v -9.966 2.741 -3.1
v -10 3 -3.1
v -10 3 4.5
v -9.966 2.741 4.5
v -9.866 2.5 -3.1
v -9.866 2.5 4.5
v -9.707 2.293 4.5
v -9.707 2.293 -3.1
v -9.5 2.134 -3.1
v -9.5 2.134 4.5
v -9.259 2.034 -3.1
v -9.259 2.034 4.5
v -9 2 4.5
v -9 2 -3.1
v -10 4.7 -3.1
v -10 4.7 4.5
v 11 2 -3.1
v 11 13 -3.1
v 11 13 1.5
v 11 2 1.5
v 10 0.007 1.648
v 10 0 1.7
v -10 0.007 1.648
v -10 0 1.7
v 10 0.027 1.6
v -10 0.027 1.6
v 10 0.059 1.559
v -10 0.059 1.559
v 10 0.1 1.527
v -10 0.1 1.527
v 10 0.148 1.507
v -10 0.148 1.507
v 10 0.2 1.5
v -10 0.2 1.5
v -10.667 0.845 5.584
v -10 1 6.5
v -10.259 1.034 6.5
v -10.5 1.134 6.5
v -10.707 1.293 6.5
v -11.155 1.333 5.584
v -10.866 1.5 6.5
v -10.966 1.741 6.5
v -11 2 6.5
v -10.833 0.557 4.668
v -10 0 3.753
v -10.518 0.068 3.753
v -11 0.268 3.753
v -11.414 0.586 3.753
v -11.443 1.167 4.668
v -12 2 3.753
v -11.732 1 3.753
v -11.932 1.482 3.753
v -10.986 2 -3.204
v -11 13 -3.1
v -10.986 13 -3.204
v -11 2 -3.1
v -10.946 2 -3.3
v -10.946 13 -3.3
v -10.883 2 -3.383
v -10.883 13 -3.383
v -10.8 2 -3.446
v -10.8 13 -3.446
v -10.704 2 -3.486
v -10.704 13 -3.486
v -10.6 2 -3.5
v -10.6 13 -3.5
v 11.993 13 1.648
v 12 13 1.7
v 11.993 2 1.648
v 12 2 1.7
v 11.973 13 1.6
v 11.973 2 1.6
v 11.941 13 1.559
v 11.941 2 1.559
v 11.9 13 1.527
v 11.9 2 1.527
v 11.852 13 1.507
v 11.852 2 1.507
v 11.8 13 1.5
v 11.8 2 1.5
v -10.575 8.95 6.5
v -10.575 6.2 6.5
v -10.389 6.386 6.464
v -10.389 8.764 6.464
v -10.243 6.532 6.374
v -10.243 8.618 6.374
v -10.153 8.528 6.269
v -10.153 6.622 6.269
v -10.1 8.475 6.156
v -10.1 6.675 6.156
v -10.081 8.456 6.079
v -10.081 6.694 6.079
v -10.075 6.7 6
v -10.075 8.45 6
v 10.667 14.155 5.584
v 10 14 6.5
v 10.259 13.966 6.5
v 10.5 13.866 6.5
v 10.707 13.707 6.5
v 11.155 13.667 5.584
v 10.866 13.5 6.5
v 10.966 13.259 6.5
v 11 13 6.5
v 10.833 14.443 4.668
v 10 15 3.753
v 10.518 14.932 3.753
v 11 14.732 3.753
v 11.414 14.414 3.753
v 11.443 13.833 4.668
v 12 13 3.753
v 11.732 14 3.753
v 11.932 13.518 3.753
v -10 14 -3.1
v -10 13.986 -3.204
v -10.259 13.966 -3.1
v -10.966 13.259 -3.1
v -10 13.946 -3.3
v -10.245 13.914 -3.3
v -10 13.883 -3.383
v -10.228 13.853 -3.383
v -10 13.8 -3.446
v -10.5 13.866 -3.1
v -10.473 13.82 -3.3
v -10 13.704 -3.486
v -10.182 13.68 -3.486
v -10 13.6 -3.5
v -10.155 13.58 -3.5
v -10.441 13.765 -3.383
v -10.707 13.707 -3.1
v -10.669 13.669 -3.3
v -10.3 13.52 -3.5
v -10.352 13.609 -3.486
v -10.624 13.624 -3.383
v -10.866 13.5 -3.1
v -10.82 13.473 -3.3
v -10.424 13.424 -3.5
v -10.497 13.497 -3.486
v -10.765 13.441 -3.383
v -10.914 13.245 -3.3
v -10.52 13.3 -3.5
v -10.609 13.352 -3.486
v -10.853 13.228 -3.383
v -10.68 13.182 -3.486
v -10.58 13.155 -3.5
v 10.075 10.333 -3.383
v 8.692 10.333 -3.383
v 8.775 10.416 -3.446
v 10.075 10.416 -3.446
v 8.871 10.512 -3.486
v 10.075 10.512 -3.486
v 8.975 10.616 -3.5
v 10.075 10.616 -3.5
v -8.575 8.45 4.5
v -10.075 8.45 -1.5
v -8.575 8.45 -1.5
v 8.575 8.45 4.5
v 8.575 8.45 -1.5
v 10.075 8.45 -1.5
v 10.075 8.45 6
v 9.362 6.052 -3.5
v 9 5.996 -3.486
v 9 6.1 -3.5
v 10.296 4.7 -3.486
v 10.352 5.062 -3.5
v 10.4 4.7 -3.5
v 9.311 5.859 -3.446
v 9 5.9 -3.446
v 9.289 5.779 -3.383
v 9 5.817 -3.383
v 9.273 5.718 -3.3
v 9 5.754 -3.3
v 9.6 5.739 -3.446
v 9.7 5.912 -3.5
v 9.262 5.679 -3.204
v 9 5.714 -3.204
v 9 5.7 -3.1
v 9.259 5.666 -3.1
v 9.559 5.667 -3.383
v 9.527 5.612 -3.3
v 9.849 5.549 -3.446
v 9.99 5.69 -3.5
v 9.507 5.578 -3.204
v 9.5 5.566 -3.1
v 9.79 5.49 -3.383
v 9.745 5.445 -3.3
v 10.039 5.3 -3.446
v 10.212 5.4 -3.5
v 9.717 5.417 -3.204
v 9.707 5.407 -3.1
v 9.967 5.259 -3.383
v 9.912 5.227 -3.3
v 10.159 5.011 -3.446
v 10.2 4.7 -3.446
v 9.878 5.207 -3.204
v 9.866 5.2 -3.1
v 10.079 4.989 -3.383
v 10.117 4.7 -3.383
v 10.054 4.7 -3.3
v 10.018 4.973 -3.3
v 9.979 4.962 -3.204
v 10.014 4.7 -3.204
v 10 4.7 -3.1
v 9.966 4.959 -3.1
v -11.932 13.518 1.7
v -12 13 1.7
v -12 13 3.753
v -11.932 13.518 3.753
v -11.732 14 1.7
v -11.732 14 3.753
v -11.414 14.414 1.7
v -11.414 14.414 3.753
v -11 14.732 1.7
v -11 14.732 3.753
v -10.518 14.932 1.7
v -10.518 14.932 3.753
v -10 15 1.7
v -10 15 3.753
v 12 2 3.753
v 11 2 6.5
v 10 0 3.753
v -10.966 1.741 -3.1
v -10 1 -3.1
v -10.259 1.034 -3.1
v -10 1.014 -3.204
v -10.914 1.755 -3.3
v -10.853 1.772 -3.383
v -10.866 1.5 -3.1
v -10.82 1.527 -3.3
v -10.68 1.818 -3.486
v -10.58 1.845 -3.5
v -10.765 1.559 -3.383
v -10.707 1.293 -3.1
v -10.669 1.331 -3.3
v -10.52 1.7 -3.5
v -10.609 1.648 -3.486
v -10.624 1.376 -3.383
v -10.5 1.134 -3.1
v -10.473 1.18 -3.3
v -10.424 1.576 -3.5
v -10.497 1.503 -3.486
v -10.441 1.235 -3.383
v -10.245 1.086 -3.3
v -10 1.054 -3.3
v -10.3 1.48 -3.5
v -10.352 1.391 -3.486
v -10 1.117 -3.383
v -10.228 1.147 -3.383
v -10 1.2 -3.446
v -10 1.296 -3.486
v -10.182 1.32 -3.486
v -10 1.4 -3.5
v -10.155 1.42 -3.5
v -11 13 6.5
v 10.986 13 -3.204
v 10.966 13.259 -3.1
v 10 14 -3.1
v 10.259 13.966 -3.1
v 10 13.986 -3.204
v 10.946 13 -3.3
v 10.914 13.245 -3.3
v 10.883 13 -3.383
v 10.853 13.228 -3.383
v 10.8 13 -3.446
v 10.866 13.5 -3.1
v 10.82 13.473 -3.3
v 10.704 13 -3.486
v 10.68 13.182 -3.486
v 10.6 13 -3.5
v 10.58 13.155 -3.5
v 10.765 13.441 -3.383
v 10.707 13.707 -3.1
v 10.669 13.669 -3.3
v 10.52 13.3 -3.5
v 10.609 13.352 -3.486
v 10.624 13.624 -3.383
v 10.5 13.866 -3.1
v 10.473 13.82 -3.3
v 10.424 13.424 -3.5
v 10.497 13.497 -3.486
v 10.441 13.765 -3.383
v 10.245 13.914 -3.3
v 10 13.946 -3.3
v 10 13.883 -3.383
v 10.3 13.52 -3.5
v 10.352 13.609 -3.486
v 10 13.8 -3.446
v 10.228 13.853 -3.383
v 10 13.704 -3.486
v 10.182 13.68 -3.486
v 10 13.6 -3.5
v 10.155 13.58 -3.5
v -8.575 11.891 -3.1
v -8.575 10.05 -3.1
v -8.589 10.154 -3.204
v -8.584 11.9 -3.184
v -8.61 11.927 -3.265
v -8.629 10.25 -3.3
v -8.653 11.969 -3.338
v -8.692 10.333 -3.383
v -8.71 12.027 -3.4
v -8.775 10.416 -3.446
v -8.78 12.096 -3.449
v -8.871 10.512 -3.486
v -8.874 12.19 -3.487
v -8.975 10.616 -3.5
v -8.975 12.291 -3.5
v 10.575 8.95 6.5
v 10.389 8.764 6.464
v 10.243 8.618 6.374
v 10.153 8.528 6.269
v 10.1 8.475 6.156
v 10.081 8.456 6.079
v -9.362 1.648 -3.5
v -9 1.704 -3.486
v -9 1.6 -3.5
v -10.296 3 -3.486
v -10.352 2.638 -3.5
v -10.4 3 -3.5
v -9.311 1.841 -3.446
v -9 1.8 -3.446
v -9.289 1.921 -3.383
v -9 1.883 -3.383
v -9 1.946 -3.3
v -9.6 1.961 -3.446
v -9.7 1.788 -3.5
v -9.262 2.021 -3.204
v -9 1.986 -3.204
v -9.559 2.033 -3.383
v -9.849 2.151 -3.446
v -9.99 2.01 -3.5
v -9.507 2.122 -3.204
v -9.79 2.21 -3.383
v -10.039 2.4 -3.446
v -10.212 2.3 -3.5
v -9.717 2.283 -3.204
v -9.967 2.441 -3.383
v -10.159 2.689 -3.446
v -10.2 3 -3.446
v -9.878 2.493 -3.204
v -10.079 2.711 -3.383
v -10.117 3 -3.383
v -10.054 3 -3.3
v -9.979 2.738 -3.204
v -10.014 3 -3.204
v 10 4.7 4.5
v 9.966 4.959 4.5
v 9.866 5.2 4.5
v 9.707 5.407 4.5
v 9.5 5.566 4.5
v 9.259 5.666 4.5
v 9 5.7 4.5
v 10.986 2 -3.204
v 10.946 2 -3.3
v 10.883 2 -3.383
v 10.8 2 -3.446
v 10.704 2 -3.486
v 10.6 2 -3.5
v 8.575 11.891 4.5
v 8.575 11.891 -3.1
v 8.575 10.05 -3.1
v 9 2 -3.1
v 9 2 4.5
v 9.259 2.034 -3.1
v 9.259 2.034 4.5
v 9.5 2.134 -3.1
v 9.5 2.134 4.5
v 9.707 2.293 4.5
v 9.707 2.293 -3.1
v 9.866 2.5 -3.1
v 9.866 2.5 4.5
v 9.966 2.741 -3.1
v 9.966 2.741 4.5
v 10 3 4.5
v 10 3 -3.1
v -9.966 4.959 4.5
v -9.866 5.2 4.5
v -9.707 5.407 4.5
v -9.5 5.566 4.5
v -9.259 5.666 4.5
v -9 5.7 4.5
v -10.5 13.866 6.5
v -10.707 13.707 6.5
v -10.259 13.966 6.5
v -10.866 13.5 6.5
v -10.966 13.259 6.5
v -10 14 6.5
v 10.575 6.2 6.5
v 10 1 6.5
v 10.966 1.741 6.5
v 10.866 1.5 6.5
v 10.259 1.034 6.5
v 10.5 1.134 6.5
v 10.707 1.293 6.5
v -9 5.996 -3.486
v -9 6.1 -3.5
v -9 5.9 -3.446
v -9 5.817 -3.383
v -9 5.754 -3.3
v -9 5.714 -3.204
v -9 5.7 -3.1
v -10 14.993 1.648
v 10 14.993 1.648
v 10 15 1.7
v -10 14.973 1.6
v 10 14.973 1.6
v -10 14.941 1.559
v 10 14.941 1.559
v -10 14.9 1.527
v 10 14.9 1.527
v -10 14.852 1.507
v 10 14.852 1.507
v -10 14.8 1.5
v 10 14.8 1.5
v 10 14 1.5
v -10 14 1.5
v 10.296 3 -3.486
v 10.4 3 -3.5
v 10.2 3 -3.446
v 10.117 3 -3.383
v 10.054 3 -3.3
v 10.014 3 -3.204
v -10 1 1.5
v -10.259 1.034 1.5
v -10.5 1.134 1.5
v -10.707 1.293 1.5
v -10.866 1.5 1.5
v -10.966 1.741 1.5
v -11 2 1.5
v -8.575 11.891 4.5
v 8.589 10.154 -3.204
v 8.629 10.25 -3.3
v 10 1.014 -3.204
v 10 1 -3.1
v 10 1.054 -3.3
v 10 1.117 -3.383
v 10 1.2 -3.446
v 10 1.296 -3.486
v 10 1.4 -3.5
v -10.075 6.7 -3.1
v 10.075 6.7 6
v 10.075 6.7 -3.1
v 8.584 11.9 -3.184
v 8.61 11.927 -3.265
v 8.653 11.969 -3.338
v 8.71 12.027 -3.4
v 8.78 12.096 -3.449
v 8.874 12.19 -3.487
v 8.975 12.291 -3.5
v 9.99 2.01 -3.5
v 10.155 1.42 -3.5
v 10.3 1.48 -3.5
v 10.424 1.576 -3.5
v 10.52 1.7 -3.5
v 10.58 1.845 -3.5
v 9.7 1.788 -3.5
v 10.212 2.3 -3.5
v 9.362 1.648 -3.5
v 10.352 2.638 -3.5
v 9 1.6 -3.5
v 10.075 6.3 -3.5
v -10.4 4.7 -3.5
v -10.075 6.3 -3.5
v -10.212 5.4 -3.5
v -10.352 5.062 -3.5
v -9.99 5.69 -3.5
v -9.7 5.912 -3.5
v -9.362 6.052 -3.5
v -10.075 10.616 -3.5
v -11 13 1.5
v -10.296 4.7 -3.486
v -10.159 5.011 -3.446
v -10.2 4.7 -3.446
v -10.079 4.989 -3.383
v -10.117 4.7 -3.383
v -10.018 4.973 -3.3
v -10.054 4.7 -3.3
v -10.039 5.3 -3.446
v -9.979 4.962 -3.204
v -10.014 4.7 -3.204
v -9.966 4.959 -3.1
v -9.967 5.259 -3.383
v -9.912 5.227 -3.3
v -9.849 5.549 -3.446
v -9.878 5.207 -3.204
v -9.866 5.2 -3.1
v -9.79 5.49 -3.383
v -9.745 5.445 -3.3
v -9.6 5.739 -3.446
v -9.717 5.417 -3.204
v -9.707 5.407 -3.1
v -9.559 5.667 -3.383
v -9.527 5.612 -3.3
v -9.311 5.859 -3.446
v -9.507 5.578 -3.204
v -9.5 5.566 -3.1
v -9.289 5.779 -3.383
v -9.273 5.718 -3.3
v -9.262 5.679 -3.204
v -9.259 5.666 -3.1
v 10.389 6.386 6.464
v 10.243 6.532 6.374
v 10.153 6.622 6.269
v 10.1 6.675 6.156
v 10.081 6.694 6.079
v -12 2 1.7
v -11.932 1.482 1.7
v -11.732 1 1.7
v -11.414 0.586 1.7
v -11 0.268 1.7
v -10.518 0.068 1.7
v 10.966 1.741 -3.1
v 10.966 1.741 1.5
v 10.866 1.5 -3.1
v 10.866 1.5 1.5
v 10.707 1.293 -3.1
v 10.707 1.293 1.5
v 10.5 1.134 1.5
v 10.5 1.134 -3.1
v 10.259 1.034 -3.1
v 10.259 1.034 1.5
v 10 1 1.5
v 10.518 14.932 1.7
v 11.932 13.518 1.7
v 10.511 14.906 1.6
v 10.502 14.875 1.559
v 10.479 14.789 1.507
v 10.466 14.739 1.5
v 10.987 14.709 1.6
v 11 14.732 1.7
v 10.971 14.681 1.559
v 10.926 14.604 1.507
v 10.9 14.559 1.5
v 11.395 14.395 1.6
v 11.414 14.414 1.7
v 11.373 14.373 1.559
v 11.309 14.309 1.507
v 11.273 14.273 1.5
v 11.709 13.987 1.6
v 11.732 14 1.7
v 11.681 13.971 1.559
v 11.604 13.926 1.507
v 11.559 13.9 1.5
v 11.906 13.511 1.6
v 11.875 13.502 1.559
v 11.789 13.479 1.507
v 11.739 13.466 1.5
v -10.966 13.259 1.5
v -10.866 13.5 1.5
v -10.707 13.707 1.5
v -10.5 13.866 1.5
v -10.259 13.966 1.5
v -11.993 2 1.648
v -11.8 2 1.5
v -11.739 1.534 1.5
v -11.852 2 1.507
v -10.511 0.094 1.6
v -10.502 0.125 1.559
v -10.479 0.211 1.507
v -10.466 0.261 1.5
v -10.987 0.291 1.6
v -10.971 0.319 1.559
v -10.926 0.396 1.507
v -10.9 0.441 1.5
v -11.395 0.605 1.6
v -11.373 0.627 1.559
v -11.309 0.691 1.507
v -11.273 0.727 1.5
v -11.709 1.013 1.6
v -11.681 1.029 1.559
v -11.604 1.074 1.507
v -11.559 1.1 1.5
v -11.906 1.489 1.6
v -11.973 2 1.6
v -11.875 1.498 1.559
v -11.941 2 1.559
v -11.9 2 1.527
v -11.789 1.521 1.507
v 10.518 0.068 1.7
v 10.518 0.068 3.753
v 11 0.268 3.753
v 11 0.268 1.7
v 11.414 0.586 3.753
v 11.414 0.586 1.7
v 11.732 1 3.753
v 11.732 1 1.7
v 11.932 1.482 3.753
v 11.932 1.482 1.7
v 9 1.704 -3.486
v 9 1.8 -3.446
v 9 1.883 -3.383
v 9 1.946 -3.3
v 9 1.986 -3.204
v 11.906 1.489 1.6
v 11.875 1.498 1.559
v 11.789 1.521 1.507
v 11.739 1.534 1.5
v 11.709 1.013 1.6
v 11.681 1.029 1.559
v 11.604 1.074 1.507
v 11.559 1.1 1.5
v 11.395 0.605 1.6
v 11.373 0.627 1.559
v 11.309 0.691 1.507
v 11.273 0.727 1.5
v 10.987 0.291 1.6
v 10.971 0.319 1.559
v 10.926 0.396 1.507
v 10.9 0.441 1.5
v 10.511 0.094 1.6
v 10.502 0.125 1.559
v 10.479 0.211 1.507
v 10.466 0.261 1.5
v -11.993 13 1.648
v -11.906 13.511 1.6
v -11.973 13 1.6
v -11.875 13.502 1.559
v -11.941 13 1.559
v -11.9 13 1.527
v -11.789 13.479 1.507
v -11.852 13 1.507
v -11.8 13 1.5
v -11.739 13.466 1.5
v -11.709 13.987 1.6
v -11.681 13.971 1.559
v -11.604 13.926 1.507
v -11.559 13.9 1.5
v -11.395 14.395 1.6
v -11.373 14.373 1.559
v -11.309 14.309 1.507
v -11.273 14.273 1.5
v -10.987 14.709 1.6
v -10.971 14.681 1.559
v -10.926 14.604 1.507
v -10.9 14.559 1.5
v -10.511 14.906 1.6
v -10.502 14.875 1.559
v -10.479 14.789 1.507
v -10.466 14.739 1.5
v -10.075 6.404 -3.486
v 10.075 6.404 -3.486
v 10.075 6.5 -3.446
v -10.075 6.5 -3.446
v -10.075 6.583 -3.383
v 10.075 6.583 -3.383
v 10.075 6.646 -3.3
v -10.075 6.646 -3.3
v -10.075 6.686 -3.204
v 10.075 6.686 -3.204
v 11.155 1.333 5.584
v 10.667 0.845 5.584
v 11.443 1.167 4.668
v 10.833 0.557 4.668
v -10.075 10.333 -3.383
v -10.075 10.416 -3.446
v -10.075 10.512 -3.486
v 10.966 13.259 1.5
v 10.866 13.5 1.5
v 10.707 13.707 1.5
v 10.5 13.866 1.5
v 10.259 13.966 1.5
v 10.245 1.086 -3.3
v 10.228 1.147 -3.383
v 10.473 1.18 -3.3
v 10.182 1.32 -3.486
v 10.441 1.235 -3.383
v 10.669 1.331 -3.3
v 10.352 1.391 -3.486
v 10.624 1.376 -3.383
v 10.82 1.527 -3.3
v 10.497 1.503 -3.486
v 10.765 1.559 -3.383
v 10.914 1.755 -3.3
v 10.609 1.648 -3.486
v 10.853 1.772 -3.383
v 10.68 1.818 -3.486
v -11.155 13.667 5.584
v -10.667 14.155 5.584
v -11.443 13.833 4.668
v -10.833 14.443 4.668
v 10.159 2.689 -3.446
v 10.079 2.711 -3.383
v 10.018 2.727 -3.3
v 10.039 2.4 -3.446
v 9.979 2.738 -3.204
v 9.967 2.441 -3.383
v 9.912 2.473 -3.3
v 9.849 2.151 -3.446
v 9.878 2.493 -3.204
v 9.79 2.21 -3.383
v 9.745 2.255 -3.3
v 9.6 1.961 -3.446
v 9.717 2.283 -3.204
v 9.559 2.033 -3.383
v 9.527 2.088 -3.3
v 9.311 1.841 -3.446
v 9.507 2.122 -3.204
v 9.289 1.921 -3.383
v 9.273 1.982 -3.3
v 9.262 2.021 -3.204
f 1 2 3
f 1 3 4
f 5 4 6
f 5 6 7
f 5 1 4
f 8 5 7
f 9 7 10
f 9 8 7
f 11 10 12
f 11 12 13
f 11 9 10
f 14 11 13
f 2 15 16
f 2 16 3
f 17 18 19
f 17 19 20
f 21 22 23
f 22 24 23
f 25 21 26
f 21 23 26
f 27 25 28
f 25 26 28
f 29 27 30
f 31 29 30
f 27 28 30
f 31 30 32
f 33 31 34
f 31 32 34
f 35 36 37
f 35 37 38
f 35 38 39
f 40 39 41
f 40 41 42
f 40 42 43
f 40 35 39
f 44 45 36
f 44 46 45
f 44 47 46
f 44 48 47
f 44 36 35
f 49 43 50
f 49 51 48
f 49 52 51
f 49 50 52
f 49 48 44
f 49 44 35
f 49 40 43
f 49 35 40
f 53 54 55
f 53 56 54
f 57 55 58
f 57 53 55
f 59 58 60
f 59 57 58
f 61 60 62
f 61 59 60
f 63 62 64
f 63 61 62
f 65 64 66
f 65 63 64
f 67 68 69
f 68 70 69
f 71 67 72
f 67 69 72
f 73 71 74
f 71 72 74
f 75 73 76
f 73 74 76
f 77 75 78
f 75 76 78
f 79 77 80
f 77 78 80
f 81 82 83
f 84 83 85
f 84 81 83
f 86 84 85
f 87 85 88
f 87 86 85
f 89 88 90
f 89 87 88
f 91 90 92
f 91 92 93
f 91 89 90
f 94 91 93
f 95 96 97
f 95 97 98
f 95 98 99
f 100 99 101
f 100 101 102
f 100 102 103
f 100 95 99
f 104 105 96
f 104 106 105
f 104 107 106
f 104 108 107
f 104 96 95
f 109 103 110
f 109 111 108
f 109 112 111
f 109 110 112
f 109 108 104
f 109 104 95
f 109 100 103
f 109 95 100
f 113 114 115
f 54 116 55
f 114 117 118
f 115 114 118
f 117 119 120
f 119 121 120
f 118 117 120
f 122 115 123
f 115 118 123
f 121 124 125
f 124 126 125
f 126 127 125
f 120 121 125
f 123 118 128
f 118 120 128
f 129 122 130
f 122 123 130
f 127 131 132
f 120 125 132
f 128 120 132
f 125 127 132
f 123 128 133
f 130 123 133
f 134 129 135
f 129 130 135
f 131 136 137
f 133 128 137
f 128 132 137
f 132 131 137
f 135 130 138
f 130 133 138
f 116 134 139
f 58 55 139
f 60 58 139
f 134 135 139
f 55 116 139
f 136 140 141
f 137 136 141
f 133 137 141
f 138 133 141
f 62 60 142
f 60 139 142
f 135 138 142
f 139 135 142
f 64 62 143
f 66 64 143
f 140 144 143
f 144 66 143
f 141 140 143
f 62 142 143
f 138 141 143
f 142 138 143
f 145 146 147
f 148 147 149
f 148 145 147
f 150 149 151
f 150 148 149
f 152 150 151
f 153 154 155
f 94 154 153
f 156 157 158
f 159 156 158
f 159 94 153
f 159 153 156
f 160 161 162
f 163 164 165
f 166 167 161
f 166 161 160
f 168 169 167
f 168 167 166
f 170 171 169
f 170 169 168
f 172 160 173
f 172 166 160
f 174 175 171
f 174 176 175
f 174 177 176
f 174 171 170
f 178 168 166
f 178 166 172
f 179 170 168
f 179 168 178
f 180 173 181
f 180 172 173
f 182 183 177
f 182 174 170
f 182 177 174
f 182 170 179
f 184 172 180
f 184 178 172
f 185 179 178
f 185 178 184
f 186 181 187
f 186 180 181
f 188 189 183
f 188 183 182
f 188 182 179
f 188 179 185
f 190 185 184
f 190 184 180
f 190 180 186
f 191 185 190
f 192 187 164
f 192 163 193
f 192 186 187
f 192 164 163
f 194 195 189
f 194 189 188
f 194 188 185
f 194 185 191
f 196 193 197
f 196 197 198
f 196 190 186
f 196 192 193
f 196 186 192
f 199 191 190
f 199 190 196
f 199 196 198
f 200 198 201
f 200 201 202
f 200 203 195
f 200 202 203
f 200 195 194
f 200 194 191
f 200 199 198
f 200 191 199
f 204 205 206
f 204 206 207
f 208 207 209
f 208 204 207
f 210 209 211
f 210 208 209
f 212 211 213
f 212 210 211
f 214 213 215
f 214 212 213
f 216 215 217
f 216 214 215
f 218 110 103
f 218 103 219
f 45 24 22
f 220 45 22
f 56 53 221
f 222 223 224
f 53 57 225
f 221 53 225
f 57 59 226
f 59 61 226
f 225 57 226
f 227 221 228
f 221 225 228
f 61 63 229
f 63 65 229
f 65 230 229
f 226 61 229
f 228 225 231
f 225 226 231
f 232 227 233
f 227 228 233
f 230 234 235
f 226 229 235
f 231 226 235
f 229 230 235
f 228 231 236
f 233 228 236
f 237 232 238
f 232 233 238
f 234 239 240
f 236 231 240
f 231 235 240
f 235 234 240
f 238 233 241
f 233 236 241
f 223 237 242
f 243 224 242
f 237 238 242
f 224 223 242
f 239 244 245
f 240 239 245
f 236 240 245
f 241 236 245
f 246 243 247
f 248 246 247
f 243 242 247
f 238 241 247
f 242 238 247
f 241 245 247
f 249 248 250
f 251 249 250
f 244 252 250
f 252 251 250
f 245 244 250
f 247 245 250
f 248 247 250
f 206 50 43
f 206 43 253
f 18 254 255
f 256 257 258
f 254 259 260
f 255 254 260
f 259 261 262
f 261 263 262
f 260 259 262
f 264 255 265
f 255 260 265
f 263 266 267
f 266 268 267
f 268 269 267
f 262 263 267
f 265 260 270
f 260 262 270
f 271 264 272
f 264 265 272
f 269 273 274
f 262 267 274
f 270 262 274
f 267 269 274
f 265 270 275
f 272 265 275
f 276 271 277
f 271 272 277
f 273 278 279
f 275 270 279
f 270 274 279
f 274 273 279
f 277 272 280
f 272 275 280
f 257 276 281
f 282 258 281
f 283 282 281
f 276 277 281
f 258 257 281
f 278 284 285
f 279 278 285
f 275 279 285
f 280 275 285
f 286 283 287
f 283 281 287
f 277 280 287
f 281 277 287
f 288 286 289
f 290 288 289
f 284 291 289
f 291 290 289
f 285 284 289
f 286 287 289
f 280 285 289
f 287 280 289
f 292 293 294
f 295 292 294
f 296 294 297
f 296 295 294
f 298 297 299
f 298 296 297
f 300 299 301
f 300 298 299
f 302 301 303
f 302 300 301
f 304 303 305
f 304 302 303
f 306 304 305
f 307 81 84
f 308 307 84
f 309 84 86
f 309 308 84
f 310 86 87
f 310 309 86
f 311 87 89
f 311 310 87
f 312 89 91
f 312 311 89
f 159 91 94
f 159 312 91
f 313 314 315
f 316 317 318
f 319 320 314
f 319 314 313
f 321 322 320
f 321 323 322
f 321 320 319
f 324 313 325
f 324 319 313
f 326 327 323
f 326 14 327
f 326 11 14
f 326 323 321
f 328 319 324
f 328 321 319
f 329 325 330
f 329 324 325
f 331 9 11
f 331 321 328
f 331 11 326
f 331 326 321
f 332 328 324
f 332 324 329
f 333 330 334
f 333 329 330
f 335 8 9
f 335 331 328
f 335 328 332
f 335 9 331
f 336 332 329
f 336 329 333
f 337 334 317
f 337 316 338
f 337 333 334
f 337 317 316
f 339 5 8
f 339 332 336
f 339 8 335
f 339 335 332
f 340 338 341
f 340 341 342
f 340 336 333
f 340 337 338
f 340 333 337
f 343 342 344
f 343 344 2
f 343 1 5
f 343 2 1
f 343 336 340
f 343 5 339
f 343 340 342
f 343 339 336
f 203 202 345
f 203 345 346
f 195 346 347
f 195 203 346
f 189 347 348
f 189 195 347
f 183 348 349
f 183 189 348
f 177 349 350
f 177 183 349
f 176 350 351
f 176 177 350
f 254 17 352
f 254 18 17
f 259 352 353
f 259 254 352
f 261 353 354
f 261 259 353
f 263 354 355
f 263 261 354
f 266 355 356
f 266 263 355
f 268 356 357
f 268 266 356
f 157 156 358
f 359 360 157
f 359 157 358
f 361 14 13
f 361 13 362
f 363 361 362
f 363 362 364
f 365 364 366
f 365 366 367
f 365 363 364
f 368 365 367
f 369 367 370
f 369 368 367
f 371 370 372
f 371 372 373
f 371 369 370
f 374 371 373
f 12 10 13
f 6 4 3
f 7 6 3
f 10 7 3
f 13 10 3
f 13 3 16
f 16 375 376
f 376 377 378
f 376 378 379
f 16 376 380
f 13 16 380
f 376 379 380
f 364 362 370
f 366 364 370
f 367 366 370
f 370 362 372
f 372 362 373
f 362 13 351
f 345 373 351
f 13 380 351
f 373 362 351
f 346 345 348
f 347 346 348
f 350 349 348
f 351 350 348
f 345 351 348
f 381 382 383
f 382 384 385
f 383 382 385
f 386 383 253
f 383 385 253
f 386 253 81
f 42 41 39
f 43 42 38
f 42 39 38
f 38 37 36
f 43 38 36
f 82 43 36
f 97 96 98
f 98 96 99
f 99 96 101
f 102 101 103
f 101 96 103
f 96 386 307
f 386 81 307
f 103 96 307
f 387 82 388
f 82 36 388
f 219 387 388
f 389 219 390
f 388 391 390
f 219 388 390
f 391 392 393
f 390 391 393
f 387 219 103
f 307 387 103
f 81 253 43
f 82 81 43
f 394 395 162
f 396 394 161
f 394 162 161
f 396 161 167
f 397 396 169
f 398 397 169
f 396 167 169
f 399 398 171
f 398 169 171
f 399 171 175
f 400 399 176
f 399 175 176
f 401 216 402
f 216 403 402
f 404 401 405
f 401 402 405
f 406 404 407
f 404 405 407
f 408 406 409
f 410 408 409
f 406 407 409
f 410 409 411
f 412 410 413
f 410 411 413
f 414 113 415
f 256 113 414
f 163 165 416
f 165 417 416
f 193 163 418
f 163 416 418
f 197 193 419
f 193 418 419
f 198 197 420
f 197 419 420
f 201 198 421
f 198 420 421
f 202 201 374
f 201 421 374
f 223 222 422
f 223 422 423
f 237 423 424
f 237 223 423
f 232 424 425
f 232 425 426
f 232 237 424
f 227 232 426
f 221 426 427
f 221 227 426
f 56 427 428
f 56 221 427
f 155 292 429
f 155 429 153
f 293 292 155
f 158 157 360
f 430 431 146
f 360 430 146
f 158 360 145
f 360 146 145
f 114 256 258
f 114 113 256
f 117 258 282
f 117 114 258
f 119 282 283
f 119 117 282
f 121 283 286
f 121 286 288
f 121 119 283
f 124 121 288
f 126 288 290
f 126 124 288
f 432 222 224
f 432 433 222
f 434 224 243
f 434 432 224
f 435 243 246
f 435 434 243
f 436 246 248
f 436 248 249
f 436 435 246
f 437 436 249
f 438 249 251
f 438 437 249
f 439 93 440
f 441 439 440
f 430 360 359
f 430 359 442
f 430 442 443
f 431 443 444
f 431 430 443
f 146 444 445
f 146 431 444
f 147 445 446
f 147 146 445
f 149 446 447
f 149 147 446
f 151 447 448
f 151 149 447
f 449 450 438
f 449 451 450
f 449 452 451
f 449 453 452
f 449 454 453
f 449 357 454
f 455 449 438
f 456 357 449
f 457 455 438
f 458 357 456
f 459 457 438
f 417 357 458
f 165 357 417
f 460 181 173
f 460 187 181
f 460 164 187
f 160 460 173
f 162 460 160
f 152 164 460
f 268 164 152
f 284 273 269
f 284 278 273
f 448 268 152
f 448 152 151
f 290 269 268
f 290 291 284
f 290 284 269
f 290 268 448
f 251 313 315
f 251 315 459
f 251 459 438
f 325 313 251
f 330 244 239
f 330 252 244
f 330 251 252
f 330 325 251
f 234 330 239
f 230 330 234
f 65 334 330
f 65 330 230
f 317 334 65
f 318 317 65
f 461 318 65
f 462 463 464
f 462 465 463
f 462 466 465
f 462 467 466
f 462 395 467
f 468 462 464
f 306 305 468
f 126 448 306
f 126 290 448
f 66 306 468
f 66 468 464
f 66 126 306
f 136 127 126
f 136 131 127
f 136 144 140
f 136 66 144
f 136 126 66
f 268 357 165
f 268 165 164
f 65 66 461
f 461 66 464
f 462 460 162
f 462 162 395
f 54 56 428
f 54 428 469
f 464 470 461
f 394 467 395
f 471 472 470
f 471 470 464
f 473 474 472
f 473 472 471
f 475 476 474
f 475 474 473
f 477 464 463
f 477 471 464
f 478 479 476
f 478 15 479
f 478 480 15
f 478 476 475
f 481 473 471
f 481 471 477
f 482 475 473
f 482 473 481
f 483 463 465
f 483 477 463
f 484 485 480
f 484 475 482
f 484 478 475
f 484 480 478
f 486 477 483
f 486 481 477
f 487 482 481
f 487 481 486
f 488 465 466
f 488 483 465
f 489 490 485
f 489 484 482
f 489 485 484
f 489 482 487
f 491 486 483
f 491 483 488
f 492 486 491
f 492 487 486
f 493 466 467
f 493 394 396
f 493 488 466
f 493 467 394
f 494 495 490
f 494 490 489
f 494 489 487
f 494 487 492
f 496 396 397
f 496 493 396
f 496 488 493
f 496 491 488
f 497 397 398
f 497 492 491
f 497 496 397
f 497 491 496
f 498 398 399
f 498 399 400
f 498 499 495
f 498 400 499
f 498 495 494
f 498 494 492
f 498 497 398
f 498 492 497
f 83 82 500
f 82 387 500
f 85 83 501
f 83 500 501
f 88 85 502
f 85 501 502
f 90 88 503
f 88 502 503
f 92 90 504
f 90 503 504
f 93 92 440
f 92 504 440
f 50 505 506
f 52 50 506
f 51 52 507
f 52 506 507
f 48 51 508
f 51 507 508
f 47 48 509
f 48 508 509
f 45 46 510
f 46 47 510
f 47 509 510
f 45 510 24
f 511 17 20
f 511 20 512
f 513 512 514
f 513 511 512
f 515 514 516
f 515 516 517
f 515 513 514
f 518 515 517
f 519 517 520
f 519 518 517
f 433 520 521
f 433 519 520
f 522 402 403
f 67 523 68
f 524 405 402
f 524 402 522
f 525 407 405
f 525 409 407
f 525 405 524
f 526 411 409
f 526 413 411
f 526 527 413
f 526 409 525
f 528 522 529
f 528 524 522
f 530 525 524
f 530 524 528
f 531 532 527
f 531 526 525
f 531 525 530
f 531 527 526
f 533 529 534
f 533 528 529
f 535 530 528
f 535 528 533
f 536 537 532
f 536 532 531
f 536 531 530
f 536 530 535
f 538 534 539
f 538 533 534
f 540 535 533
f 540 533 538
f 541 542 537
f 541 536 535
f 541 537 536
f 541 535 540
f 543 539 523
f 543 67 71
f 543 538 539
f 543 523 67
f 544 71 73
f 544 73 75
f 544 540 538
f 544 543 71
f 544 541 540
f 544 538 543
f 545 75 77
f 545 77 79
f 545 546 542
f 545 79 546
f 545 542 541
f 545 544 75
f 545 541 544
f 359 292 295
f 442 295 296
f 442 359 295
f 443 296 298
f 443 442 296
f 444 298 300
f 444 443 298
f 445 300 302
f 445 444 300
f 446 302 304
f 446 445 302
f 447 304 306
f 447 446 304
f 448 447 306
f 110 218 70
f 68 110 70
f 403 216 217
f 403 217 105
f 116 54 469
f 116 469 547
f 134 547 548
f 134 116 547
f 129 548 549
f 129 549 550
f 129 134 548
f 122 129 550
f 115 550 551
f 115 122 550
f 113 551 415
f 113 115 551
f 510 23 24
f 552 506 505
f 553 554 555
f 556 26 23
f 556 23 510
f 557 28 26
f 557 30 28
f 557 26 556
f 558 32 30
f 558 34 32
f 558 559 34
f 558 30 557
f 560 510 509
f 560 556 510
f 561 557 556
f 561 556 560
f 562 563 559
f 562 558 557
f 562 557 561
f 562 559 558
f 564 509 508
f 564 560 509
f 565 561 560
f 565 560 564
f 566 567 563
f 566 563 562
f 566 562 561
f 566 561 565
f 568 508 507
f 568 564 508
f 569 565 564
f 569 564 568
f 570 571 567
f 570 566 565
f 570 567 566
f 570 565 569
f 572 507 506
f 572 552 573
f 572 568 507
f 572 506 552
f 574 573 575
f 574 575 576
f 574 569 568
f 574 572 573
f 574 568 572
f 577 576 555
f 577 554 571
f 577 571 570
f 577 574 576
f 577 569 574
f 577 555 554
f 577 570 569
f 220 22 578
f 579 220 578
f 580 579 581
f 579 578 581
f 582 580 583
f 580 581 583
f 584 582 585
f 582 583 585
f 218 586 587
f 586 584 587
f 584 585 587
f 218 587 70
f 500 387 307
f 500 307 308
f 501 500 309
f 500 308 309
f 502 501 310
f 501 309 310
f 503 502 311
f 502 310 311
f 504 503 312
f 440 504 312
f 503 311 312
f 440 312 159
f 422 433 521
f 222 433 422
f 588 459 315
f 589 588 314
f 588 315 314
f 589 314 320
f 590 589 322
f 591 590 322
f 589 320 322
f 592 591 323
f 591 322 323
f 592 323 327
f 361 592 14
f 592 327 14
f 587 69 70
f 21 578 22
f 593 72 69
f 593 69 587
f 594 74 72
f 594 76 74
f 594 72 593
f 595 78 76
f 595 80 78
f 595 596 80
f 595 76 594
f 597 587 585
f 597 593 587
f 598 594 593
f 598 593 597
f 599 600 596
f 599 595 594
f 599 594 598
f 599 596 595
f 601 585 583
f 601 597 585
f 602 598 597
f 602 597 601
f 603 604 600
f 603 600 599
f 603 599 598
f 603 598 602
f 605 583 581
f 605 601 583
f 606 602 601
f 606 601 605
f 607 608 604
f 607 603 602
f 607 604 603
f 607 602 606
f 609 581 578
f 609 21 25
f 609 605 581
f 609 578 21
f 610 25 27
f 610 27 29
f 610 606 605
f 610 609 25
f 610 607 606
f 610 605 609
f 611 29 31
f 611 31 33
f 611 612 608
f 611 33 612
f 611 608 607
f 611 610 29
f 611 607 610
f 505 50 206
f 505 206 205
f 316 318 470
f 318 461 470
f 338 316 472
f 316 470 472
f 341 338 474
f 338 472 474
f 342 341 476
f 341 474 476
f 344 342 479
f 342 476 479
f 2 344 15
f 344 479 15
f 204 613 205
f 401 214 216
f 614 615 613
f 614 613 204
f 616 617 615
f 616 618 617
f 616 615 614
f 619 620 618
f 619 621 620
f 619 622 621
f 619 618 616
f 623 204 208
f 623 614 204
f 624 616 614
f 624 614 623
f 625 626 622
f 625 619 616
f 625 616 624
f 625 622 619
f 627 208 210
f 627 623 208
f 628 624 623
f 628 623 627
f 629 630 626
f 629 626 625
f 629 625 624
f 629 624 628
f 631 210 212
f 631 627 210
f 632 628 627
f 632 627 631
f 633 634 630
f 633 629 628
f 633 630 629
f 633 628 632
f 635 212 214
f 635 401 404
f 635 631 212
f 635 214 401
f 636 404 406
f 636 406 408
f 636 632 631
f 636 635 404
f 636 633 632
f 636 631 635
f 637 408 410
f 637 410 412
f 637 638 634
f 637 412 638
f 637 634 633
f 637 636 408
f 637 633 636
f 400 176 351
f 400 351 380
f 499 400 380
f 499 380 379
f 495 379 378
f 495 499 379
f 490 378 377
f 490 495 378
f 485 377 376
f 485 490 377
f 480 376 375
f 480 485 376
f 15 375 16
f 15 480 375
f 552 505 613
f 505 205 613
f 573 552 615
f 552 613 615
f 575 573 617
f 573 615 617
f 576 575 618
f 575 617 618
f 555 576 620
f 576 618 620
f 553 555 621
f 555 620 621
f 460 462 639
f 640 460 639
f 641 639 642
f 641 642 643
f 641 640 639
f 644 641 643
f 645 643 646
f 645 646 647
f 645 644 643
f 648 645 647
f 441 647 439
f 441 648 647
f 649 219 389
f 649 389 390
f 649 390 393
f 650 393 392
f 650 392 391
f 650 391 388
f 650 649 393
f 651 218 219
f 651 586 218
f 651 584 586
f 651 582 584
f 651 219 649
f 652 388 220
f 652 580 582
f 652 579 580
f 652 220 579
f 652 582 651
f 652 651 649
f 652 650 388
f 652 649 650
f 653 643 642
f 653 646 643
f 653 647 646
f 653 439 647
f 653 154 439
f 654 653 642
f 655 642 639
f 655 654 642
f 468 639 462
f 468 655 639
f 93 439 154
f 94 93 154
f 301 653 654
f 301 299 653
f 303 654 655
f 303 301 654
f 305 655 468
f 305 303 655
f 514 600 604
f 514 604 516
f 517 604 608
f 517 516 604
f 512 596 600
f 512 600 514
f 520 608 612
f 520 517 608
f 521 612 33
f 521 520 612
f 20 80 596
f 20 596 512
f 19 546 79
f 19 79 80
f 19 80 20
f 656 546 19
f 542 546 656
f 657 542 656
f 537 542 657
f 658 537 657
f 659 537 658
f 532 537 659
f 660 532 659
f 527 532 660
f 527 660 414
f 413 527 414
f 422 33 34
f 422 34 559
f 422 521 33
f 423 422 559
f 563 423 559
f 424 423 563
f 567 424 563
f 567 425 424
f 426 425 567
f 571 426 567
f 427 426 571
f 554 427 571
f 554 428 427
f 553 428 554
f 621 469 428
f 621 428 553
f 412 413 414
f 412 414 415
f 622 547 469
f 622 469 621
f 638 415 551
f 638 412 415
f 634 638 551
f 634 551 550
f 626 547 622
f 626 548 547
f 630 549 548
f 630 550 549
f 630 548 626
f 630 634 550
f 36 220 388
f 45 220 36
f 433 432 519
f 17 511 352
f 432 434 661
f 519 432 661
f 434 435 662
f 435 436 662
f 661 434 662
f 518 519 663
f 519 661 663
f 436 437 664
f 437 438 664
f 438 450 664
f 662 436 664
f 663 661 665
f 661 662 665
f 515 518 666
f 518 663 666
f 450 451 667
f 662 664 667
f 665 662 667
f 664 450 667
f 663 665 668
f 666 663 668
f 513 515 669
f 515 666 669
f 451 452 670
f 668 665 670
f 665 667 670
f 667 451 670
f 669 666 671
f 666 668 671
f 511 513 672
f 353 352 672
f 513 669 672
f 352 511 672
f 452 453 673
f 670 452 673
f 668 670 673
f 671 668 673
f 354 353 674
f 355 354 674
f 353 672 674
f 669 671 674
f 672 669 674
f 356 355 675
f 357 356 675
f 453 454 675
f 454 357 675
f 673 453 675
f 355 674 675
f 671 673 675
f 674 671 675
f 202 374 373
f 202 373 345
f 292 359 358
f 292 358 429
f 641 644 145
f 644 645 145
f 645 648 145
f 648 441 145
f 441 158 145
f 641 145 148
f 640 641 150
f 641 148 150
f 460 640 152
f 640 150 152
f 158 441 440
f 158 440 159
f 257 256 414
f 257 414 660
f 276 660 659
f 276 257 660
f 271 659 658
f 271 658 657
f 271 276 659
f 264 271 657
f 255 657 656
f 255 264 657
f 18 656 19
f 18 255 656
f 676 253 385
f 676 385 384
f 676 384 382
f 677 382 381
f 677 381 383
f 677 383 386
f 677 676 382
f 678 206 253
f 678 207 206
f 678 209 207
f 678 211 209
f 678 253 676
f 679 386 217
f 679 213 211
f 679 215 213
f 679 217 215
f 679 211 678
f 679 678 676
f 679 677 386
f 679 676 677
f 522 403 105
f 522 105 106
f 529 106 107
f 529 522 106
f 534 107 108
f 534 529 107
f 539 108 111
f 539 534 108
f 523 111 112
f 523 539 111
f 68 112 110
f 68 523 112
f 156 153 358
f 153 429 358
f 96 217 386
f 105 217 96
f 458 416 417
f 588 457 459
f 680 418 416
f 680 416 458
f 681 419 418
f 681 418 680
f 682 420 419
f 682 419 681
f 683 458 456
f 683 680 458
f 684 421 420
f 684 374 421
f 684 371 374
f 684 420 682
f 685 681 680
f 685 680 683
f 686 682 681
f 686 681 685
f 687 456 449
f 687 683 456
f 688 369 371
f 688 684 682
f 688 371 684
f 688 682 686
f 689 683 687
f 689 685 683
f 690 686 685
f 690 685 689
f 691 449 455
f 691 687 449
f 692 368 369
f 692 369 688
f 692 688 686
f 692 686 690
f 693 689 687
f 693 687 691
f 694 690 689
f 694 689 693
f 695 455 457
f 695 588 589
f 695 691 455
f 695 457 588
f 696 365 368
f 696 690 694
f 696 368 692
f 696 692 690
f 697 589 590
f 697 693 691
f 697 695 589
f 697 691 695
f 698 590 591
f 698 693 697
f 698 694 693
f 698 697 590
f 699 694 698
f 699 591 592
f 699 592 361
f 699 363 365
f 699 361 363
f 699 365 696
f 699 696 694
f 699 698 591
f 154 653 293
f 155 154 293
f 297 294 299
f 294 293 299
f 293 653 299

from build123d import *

# Parameters (mm, degrees)
SKETCH1_W           = 24
SKETCH1_H           = 13
BOSS_EXTRUDE1_DEPTH = 15
SKETCH2_W           = 20.15
SKETCH2_H           = 1.75
CUT_EXTRUDE1_DEPTH  = 15
FILLET1_R           = 2
CHAMFER2_SIZE       = 1
CHAMFER2_SIZE2      = 2.747477419
FILLET2_R           = 0.5
CUT_EXTRUDE4_DEPTH  = 11
SKETCH5_W           = 26.855674208
SKETCH5_H           = 19.307728506
CUT_EXTRUDE5_DEPTH  = 8
CUT_EXTRUDE6_DEPTH  = 11
SKETCH7_W           = 29.982721697
SKETCH7_H           = 21.559004648
CUT_EXTRUDE7_DEPTH  = 3
CHAMFER3_SIZE       = 2
FILLET3_R           = 0.4
FILLET4_R           = 0.2


with BuildPart() as part:
    # Sketch1 → Boss-Extrude1 (new body)
    with BuildSketch(Plane(origin=(0, 0, 0), x_dir=(1, 0, 0), z_dir=(0, 1, 0))):
        Rectangle(SKETCH1_W, SKETCH1_H)
    extrude(amount=BOSS_EXTRUDE1_DEPTH)

    # Sketch2 → Cut-Extrude1 (cut)
    with BuildSketch(Plane.XY.offset(6.5)):
        with Locations((0, 7.575)):
            Rectangle(SKETCH2_W, SKETCH2_H)
    extrude(amount=-CUT_EXTRUDE1_DEPTH, mode=Mode.SUBTRACT)

    # Fillet1
    fillet1_edges = [part.edges().sort_by_distance(p)[0] for p in [
        (-12, 15, 0),
        (12, 15, 0),
        (-12, 0, 0),
        (12, 0, 0),
    ]]
    fillet(fillet1_edges, radius=FILLET1_R)

    # Chamfer2
    chamfer2_edges = [part.edges().sort_by_distance(p)[0] for p in [
        (0, 15, 6.5),
        (12, 7.5, 6.5),
        (0, 0, 6.5),
        (-12, 7.5, 6.5),
        (-11.414213562, 14.414213562, 6.5),
        (-11.414213562, 0.585786438, 6.5),
        (11.414213562, 0.585786438, 6.5),
        (11.414213562, 14.414213562, 6.5),
    ]]
    chamfer2_side = [part.faces().sort_by_distance(p)[0] for p in [
        (11.716980566, 7.5, 6.5),
    ]]
    chamfer(chamfer2_edges, length=CHAMFER2_SIZE, length2=CHAMFER2_SIZE2, reference=chamfer2_side[0])

    # Fillet2
    fillet2_edges = [part.edges().sort_by_distance(p)[0] for p in [
        (10.075, 7.575, 6.5),
        (0, 8.45, 6.5),
        (-10.075, 7.575, 6.5),
        (0, 6.7, 6.5),
    ]]
    fillet(fillet2_edges, radius=FILLET2_R)

    # Sketch4 → Cut-Extrude4 (cut)
    with BuildSketch(Plane(origin=(0, 0, -6.5), x_dir=(-1, 0, 0), z_dir=(0, 0, -1))):
        Polygon((-10.075, 8.45), (-8.575, 8.45), (-8.575, 11.891155889), (8.575, 11.891155889), (8.575, 8.45), (10.075, 8.45), (10.075, 6.7), (-10.075, 6.7), align=None)
    extrude(amount=-CUT_EXTRUDE4_DEPTH, mode=Mode.SUBTRACT)

    # Sketch5 → Cut-Extrude5 (cut)
    with BuildSketch(Plane(origin=(0, 0, -6.5), x_dir=(-1, 0, 0), z_dir=(0, 0, -1))):
        with Locations((-0.083402715, 7.762018115)):
            Rectangle(SKETCH5_W, SKETCH5_H)
        with BuildLine():
            Line((10, 14), (-10, 14))
            ThreePointArc((-10, 14), (-10.707106781, 13.707106781), (-11, 13))
            Line((-11, 13), (-11, 2))
            ThreePointArc((-11, 2), (-10.707106781, 1.292893219), (-10, 1))
            Line((-10, 1), (10, 1))
            ThreePointArc((10, 1), (10.707106781, 1.292893219), (11, 2))
            Line((11, 2), (11, 13))
            ThreePointArc((11, 13), (10.707106781, 13.707106781), (10, 14))
        make_face(mode=Mode.SUBTRACT)
    extrude(amount=-CUT_EXTRUDE5_DEPTH, mode=Mode.SUBTRACT)

    # Sketch6 → Cut-Extrude6 (cut)
    with BuildSketch(Plane(origin=(0, 0, -6.5), x_dir=(-1, 0, 0), z_dir=(0, 0, -1))):
        with BuildLine():
            Line((-9, 5.7), (9, 5.7))
            ThreePointArc((9, 5.7), (9.707106781, 5.407106781), (10, 4.7))
            Line((10, 4.7), (10, 3))
            ThreePointArc((10, 3), (9.707106781, 2.292893219), (9, 2))
            Line((9, 2), (-9, 2))
            ThreePointArc((-9, 2), (-9.707106781, 2.292893219), (-10, 3))
            Line((-10, 3), (-10, 4.7))
            ThreePointArc((-10, 4.7), (-9.707106781, 5.407106781), (-9, 5.7))
        make_face()
    extrude(amount=-CUT_EXTRUDE6_DEPTH, mode=Mode.SUBTRACT)

    # Sketch7 → Cut-Extrude7 (cut)
    with BuildSketch(Plane(origin=(0, 0, -6.5), x_dir=(-1, 0, 0), z_dir=(0, 0, -1))):
        with Locations((0.615824589, 7.279559508)):
            Rectangle(SKETCH7_W, SKETCH7_H)
    extrude(amount=-CUT_EXTRUDE7_DEPTH, mode=Mode.SUBTRACT)

    # Chamfer3
    chamfer3_edges = [part.edges().sort_by_distance(p)[0] for p in [
        (9.325, 8.45, -3.5),
        (-9.325, 8.45, -3.5),
    ]]
    chamfer(chamfer3_edges, length=CHAMFER3_SIZE)

    # Fillet3
    fillet3_edges = [part.edges().sort_by_distance(p)[0] for p in [
        (-10, 3.85, -3.5),
        (0, 14, -3.5),
        (-10.707106781, 13.707106781, -3.5),
        (-11, 7.5, -3.5),
        (-10.707106781, 1.292893219, -3.5),
        (0, 1, -3.5),
        (10.707106781, 1.292893219, -3.5),
        (11, 7.5, -3.5),
        (10.707106781, 13.707106781, -3.5),
        (0, 6.7, -3.5),
        (0, 11.891155889, -3.5),
        (-8.575, 11.170577944, -3.5),
        (-9.707106781, 2.292893219, -3.5),
        (0, 2, -3.5),
        (9.707106781, 2.292893219, -3.5),
        (10, 3.85, -3.5),
        (9.707106781, 5.407106781, -3.5),
        (0, 5.7, -3.5),
        (-9.707106781, 5.407106781, -3.5),
        (8.575, 11.170577944, -3.5),
        (-9.325, 10.45, -3.5),
        (9.325, 10.45, -3.5),
    ]]
    fillet(fillet3_edges, radius=FILLET3_R)

    # Fillet4
    fillet4_edges = [part.edges().sort_by_distance(p)[0] for p in [
        (-11.414213562, 14.414213562, 1.5),
        (0, 0, 1.5),
        (-12, 7.5, 1.5),
        (12, 7.5, 1.5),
        (11.414213562, 0.585786438, 1.5),
        (11.414213562, 14.414213562, 1.5),
        (0, 15, 1.5),
        (-11.414213562, 0.585786438, 1.5),
    ]]
    fillet(fillet4_edges, radius=FILLET4_R)


solid = part.part
